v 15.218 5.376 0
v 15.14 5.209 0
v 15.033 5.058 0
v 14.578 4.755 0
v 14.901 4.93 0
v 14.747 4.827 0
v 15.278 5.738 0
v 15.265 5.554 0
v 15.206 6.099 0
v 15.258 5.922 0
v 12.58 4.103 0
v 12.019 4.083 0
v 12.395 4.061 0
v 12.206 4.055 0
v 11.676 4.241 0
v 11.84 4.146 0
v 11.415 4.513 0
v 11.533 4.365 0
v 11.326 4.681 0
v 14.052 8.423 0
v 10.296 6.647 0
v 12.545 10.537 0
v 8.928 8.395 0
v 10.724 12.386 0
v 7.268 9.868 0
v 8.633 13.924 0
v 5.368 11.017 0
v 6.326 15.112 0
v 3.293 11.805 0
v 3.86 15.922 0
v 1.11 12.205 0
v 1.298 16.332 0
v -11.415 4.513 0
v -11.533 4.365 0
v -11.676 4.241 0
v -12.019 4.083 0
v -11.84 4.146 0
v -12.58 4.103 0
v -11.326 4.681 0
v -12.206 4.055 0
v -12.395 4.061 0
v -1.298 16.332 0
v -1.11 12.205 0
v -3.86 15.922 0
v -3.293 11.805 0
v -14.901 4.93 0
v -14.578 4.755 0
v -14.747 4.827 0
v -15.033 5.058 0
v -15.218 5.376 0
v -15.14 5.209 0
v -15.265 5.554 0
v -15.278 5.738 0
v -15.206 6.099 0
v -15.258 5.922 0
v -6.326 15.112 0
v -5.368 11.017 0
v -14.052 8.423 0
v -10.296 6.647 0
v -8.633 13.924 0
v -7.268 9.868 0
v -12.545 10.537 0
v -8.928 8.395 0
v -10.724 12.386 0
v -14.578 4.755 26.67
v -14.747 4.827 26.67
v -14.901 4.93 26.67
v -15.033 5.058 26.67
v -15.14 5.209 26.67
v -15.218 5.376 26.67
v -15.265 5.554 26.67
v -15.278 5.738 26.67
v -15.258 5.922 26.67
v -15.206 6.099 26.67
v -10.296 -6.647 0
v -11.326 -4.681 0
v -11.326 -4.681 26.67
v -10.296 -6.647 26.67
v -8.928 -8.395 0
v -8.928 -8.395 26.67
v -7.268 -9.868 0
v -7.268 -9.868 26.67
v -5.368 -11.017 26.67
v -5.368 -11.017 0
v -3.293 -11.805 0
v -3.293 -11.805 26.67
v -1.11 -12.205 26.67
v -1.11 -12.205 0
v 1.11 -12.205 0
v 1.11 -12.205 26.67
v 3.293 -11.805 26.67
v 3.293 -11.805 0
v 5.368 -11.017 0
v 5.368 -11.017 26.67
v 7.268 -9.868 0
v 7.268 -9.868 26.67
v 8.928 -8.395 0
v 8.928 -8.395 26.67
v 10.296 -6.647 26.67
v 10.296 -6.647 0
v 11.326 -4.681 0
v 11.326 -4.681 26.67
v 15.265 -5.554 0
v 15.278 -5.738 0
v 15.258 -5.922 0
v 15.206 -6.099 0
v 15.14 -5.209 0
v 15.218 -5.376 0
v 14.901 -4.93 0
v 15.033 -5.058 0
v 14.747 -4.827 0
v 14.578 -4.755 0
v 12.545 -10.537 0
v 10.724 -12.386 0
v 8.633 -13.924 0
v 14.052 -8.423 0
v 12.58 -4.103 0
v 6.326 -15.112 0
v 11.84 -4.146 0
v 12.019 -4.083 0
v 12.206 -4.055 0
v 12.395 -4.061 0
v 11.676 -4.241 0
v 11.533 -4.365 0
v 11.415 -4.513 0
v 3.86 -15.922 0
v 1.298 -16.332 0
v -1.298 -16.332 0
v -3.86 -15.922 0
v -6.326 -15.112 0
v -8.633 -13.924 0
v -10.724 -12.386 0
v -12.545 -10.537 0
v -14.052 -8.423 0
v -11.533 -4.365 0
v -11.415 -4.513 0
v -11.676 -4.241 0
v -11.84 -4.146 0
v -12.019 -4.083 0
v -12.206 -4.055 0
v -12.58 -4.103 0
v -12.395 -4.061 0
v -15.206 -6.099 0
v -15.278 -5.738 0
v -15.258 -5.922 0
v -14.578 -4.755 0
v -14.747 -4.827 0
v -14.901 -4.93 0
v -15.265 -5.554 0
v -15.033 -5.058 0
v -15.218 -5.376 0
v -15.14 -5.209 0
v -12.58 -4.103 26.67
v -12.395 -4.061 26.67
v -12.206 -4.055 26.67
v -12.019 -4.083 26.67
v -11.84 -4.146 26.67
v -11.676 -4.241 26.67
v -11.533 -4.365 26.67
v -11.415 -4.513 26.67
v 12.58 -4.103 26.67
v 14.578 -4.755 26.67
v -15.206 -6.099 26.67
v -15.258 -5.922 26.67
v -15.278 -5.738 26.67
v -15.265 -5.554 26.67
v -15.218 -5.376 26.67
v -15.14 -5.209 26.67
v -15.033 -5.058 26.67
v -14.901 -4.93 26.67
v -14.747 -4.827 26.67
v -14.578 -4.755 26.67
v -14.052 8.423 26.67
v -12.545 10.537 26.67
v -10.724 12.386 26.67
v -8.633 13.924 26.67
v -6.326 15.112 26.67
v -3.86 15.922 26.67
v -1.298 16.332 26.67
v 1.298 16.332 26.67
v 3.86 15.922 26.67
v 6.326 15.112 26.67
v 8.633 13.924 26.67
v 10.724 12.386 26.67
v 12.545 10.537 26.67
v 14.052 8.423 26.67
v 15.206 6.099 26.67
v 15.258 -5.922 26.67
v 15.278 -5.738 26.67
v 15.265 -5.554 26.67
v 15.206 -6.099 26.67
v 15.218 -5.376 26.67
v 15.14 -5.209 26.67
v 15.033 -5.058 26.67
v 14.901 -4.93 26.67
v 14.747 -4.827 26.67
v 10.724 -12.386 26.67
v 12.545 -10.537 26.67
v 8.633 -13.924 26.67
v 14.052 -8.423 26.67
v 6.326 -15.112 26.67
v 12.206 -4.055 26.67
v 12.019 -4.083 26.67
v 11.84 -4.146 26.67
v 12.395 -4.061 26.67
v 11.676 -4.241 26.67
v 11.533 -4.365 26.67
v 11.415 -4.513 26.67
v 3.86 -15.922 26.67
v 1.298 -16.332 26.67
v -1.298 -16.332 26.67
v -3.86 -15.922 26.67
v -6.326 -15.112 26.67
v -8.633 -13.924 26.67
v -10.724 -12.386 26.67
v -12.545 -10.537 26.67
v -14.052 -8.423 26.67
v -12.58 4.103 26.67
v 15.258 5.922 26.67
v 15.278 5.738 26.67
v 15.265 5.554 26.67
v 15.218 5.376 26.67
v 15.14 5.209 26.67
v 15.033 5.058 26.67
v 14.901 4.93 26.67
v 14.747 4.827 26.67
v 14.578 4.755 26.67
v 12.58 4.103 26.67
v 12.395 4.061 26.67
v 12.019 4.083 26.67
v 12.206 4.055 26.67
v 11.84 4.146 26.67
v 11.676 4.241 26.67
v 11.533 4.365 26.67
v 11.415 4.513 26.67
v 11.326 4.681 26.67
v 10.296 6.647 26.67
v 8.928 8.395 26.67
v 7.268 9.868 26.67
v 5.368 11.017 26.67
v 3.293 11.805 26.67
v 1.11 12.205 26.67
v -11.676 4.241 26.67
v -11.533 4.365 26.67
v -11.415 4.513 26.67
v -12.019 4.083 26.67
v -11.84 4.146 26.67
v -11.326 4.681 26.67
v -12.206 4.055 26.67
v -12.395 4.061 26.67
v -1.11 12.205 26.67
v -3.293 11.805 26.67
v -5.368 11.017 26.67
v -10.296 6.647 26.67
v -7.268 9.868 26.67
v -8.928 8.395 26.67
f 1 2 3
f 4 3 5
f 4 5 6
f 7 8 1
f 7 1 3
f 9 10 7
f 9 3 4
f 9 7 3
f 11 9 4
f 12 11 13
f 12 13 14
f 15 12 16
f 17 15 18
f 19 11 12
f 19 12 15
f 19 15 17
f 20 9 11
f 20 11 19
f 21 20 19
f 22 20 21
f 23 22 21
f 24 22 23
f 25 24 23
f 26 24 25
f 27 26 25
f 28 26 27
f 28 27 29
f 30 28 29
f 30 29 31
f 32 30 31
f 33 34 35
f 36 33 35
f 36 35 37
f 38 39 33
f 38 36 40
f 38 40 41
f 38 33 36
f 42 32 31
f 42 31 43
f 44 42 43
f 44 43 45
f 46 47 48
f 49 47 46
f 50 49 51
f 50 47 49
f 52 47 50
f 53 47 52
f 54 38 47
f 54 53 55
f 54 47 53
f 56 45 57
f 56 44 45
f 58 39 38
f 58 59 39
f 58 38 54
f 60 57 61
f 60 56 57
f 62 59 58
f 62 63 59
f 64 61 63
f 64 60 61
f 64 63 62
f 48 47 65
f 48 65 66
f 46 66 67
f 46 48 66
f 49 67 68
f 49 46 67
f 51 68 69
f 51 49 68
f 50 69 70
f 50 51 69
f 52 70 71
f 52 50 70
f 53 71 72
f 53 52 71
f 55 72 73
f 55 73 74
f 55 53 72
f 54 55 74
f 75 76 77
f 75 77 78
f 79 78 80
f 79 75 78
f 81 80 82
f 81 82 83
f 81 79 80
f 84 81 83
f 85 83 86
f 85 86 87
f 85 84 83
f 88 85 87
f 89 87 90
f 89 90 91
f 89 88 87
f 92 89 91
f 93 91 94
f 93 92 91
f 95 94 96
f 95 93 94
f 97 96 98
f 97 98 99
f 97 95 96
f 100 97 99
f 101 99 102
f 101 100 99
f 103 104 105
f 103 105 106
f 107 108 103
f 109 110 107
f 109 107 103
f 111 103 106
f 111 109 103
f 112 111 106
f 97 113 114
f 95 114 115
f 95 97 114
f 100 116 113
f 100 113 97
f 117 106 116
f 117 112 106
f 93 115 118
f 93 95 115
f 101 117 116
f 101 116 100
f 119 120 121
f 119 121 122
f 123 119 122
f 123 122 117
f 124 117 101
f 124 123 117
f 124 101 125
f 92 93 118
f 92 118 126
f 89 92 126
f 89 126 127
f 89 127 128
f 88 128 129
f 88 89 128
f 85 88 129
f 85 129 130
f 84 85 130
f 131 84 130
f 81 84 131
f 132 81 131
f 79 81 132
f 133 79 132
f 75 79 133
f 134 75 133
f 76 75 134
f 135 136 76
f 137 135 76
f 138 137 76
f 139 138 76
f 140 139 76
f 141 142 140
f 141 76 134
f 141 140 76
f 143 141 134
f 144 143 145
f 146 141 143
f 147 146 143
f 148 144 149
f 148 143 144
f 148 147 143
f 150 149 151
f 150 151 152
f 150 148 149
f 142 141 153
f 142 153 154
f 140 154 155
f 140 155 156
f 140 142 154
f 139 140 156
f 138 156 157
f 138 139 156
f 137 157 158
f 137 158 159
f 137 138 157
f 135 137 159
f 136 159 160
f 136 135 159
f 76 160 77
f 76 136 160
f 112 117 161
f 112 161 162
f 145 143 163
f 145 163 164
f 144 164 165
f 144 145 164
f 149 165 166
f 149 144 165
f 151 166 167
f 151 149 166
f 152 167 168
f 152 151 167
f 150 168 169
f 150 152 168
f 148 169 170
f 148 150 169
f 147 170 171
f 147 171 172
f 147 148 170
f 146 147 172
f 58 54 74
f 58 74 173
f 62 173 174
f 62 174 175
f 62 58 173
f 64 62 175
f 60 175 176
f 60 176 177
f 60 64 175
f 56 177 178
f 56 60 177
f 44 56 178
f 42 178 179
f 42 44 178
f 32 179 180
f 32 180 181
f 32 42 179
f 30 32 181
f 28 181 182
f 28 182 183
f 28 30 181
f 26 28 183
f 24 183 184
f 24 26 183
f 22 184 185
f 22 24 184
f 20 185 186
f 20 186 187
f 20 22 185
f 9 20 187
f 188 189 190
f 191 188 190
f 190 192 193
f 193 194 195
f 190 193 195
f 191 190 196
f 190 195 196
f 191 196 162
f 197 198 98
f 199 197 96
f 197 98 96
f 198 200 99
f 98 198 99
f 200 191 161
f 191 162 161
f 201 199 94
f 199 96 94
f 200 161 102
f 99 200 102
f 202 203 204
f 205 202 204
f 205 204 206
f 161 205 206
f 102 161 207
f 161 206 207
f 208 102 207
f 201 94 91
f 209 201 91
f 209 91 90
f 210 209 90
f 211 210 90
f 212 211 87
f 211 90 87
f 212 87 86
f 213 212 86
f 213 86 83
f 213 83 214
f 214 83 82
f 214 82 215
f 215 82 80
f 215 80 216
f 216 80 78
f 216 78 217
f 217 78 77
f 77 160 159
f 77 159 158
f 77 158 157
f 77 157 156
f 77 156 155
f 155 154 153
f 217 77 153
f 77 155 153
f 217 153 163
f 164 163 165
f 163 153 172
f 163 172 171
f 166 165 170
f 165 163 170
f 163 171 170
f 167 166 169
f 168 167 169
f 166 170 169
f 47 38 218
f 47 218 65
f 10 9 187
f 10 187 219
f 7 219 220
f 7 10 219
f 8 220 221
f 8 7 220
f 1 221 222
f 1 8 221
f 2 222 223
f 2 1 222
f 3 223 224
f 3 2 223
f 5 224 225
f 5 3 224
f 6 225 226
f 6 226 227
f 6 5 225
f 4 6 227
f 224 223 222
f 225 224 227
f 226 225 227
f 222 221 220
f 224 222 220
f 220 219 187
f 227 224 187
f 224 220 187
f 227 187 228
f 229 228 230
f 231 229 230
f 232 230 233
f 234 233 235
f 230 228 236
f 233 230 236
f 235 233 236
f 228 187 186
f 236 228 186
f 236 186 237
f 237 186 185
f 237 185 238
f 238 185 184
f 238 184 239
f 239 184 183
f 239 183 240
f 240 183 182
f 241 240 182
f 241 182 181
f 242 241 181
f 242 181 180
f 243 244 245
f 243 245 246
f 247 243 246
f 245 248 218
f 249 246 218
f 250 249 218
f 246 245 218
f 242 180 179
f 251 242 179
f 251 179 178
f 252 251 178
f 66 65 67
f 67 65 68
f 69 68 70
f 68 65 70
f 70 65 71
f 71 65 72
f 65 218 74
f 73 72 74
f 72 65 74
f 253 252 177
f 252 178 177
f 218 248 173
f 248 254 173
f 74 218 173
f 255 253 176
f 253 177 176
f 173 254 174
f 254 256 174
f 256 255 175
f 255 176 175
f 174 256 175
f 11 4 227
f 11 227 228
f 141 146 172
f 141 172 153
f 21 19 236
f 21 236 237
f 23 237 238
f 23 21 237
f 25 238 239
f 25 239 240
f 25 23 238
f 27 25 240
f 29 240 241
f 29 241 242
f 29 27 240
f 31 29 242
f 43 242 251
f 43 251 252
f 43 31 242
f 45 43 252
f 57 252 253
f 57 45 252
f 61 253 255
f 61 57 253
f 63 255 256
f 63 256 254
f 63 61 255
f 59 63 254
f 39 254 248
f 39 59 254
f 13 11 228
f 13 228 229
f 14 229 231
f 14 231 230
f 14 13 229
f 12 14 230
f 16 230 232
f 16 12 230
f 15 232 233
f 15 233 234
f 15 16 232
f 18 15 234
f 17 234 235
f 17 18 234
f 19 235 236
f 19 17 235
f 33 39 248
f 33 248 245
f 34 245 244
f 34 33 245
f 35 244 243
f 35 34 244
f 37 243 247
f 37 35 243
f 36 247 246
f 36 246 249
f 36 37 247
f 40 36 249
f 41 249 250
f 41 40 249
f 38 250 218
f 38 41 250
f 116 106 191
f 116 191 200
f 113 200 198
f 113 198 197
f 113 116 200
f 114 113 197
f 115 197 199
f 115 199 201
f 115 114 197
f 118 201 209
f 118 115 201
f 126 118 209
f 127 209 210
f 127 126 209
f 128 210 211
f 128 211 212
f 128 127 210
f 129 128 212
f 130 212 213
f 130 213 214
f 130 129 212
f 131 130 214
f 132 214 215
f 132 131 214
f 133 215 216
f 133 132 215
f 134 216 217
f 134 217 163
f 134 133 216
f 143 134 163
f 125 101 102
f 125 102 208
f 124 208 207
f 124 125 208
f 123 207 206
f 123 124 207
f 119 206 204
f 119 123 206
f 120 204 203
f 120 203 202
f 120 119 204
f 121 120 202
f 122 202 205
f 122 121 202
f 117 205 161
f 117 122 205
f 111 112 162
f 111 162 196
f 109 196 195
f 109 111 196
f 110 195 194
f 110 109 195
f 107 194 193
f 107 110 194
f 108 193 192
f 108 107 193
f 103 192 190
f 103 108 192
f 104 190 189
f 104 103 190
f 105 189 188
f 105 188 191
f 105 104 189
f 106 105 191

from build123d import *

# Parameters (mm, degrees)
BOSS_EXTRUDE1_DEPTH   = 26.67
BOSS_EXTRUDE1_2_DEPTH = 26.67


with BuildPart() as part:
    # Sketch1 → Boss-Extrude1 (new body)
    with BuildSketch(Plane.XY):
        with BuildLine():
            Line((-12.580337264, 4.103117178), (-14.577613892, 4.75453533))
            ThreePointArc((-14.577613892, 4.75453533), (-15.183079054, 5.290424814), (-15.205555307, 6.098670085))
            ThreePointArc((-15.205555307, 6.098670085), (0, 16.383), (15.205555307, 6.098670085))
            ThreePointArc((15.205555307, 6.098670085), (15.183079054, 5.290424814), (14.577613892, 4.75453533))
            Line((14.577613892, 4.75453533), (12.580337264, 4.103117178))
            ThreePointArc((12.580337264, 4.103117178), (11.840088209, 4.146298157), (11.326328284, 4.68097937))
            ThreePointArc((11.326328284, 4.68097937), (0, 12.2555), (-11.326328284, 4.68097937))
            ThreePointArc((-11.326328284, 4.68097937), (-11.840088209, 4.146298157), (-12.580337264, 4.103117178))
        make_face()
    extrude(amount=BOSS_EXTRUDE1_DEPTH)


with BuildPart() as body_2:
    # Sketch1 → Boss-Extrude1 2 (new body)
    with BuildSketch(Plane.XY):
        with BuildLine():
            Line((12.580337264, -4.103117178), (14.577613892, -4.75453533))
            ThreePointArc((14.577613892, -4.75453533), (15.183079054, -5.290424814), (15.205555307, -6.098670085))
            ThreePointArc((15.205555307, -6.098670085), (0, -16.383), (-15.205555307, -6.098670085))
            ThreePointArc((-15.205555307, -6.098670085), (-15.183079054, -5.290424814), (-14.577613892, -4.75453533))
            Line((-14.577613892, -4.75453533), (-12.580337264, -4.103117178))
            ThreePointArc((-12.580337264, -4.103117178), (-11.840088209, -4.146298157), (-11.326328284, -4.68097937))
            ThreePointArc((-11.326328284, -4.68097937), (0, -12.2555), (11.326328284, -4.68097937))
            ThreePointArc((11.326328284, -4.68097937), (11.840088209, -4.146298157), (12.580337264, -4.103117178))
        make_face()
    extrude(amount=BOSS_EXTRUDE1_2_DEPTH)


solid = Compound([part.part, body_2.part])
